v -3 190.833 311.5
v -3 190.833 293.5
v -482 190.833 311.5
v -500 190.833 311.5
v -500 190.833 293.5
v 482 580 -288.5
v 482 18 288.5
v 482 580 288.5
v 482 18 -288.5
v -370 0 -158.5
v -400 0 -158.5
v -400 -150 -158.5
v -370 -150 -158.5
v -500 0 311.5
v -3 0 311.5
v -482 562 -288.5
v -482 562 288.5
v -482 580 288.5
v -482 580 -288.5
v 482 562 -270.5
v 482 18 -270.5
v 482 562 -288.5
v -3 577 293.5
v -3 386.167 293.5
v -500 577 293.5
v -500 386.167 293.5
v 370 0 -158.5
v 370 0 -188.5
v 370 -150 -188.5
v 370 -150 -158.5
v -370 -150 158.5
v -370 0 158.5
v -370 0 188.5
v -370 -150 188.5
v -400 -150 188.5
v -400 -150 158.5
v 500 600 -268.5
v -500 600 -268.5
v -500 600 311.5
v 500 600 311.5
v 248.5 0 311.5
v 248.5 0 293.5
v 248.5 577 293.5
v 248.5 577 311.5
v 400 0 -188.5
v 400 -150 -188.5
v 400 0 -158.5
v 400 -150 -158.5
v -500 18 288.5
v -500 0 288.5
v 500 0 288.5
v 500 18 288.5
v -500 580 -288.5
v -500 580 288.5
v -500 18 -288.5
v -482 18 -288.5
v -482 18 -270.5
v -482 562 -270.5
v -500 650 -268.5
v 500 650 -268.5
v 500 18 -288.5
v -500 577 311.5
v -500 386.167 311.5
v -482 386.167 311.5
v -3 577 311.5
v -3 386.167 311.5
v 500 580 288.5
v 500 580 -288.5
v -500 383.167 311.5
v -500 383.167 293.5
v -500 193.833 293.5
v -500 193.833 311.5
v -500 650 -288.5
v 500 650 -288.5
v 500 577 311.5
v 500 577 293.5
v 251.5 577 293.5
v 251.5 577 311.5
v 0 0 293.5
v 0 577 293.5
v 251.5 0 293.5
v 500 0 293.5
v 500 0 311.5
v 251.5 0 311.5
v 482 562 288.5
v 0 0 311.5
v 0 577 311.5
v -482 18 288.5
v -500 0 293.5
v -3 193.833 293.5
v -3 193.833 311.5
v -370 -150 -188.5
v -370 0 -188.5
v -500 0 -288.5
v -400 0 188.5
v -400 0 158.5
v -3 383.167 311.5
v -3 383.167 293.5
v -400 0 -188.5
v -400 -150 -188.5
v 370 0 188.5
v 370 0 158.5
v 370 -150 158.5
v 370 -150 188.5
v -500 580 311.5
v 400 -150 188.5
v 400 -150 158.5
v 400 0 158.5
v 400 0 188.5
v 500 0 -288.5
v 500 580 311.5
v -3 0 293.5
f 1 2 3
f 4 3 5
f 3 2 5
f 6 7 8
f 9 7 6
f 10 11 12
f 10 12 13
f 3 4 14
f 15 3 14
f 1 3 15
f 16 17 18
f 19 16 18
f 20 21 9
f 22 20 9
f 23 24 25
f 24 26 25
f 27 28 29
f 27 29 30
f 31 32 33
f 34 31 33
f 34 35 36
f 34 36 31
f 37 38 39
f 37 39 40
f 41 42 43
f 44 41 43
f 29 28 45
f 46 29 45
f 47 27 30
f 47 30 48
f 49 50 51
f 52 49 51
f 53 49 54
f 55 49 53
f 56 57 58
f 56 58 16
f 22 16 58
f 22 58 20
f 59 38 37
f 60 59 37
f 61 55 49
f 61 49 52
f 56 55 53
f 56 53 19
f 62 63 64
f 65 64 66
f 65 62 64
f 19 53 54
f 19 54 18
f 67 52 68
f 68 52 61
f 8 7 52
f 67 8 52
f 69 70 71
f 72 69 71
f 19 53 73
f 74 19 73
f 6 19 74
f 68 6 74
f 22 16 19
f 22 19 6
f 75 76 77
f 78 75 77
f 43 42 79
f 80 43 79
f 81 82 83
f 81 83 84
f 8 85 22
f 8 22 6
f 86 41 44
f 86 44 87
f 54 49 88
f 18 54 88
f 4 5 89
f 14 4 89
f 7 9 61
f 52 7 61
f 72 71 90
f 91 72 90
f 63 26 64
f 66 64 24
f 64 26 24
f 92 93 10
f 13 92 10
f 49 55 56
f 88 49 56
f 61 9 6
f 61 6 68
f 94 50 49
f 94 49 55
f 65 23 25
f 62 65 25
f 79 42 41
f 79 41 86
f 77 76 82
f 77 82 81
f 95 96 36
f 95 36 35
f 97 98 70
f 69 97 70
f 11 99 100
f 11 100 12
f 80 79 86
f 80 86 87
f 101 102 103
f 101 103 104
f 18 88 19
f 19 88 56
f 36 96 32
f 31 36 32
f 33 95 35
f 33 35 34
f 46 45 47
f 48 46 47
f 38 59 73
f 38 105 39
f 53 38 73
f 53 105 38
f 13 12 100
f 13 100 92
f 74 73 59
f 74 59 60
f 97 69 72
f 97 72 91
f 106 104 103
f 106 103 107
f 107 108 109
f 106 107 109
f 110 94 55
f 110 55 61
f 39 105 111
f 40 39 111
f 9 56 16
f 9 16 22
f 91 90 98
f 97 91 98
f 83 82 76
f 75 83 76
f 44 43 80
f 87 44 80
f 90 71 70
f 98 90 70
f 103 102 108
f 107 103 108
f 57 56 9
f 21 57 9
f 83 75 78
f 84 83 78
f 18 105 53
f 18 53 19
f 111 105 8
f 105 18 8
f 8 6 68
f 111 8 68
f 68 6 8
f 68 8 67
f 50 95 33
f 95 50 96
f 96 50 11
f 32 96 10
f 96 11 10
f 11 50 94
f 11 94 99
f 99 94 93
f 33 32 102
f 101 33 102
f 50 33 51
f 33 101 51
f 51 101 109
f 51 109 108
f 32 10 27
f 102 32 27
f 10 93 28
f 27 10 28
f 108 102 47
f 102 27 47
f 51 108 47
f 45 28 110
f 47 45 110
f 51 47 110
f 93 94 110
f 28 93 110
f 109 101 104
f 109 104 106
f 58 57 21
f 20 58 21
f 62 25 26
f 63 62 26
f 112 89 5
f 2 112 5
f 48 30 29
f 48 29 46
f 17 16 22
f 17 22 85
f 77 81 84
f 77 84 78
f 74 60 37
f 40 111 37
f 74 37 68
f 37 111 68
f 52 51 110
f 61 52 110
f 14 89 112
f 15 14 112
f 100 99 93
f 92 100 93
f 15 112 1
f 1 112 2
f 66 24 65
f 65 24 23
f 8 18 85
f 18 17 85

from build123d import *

# Parameters (mm, degrees)
CROQUIS1_W                = 1000
CROQUIS1_H                = 577
SALIENTE_EXTRUIR1_DEPTH   = 580
VACIADO1_T                = -18
CROQUIS2_W                = 1000
CROQUIS2_H                = 600
SALIENTE_EXTRUIR2_DEPTH   = 20
CROQUIS3_W                = 479
CROQUIS3_H                = 175.833333333
CROQUIS3_W_2              = 18
CROQUIS3_H_2              = 189.333333334
CROQUIS3_H_3              = 172.833333333
SALIENTE_EXTRUIR4_DEPTH   = 23
CROQUIS5_W                = 5
CROQUIS5_H                = 577
CORTAR_EXTRUIR1_DEPTH     = 1208.075908963
CROQUIS6_W                = 248.5
CROQUIS6_H                = 577
SALIENTE_EXTRUIR5_DEPTH   = 18
SALIENTE_EXTRUIR5_2_DEPTH = 18
PARTIR5_OUTLINE_W         = 1000
PARTIR5_OUTLINE_H         = 577
PARTIR5_DEPTH             = 18
PARTIR5_2_OUTLINE_W       = 1000
PARTIR5_2_OUTLINE_H       = 577
PARTIR5_2_DEPTH           = 18
PARTIR6_START             = 18
PARTIR6_OUTLINE_W         = 18
PARTIR6_OUTLINE_H         = 577
PARTIR6_DEPTH             = 562
PARTIR6_2_OUTLINE_W       = 18
PARTIR6_2_OUTLINE_H       = 577
PARTIR6_2_DEPTH           = 562
PARTIR6_START_2           = -500
PARTIR6_3_OUTLINE_W       = 562
PARTIR6_3_OUTLINE_H       = 577
PARTIR6_3_DEPTH           = 18
PARTIR6_START_3           = 482
PARTIR6_4_OUTLINE_W       = 562
PARTIR6_4_OUTLINE_H       = 577
PARTIR6_4_DEPTH           = 18
PARTIR11_START            = -482
PARTIR11_OUTLINE_W        = 544
PARTIR11_OUTLINE_H        = 18
PARTIR11_DEPTH            = 964
PARTIR11_START_2          = 18
PARTIR11_2_OUTLINE_W      = 964
PARTIR11_2_OUTLINE_H      = 18
PARTIR11_2_DEPTH          = 544
CROQUIS7_W                = 1000
CROQUIS7_H                = 20
SALIENTE_EXTRUIR6_DEPTH   = 50
CROQUIS8_W                = 30
CROQUIS8_H                = 30
SALIENTE_EXTRUIR7_DEPTH   = 150


# Read off the part's stored shape, not the designer's step: Partir5, Partir6, Partir11
with BuildPart() as part:
    # Croquis1 → Saliente-Extruir1 (new body)
    with BuildSketch(Plane(origin=(0, 0, 0), x_dir=(1, 0, 0), z_dir=(0, 1, 0))):
        Rectangle(CROQUIS1_W, CROQUIS1_H)
    extrude(amount=SALIENTE_EXTRUIR1_DEPTH)

    # Vaciado1
    vaciado1_openings = [part.faces().sort_by_distance(p)[0] for p in [
        (0, 290, 288.5),
    ]]
    offset(amount=VACIADO1_T, openings=vaciado1_openings, kind=Kind.INTERSECTION)

    # Croquis2 → Saliente-Extruir2 (add)
    with BuildSketch(Plane(origin=(0, 580, 0), x_dir=(1, 0, 0), z_dir=(0, 1, 0))):
        with Locations((0, -11.5)):
            Rectangle(CROQUIS2_W, CROQUIS2_H)
    extrude(amount=SALIENTE_EXTRUIR2_DEPTH)

    # Croquis3 → Saliente-Extruir4 (add)
    with BuildSketch(Plane.XY.offset(288.5)):
        Polygon((-3, 577), (-500, 577), (-500, 386.166666667), (-482, 386.166666667), (-482, 562), (-3, 562), align=None)
        with Locations((-242.5, 474.083333334)):
            Rectangle(CROQUIS3_W, CROQUIS3_H)
        with Locations((-491, 288.5)):
            Rectangle(CROQUIS3_W_2, CROQUIS3_H_2)
        with Locations((-242.5, 288.5)):
            Rectangle(CROQUIS3_W, CROQUIS3_H_2)
        Polygon((-482, 18), (-482, 190.833333333), (-500, 190.833333333), (-500, 0), (-3, 0), (-3, 18), align=None)
        with Locations((-242.5, 104.416666667)):
            Rectangle(CROQUIS3_W, CROQUIS3_H_3)
    extrude(amount=SALIENTE_EXTRUIR4_DEPTH)

    # Croquis5 → Cortar-Extruir1 (cut, through all)
    with BuildSketch(Plane.ZY.offset(500)):
        with Locations((291, 288.5)):
            Rectangle(CROQUIS5_W, CROQUIS5_H)
    extrude(amount=-CORTAR_EXTRUIR1_DEPTH, mode=Mode.SUBTRACT)


with BuildPart() as cortar_extruir1_piece_1:
    # of the separate pieces the step leaves, piece 1, a body of its own (cortar_extruir1_pieces)
    add(part.part.solids().sort_by_distance((-500, 0, -288.5))[0])

    # Partir5 2 outline → Partir5 2 (cut)
    with BuildSketch(Plane(origin=(0, 0, 0), x_dir=(1, 0, 0), z_dir=(0, 1, 0))):
        Rectangle(PARTIR5_2_OUTLINE_W, PARTIR5_2_OUTLINE_H)
    extrude(amount=PARTIR5_2_DEPTH, mode=Mode.SUBTRACT)

    # Partir6 3 outline → Partir6 3 (cut)
    with BuildSketch(Plane.YZ.offset(PARTIR6_START_2)):
        with Locations((299, 0)):
            Rectangle(PARTIR6_3_OUTLINE_W, PARTIR6_3_OUTLINE_H)
    extrude(amount=PARTIR6_3_DEPTH, mode=Mode.SUBTRACT)

    # Partir6 4 outline → Partir6 4 (cut)
    with BuildSketch(Plane.YZ.offset(PARTIR6_START_3)):
        with Locations((299, 0)):
            Rectangle(PARTIR6_4_OUTLINE_W, PARTIR6_4_OUTLINE_H)
    extrude(amount=PARTIR6_4_DEPTH, mode=Mode.SUBTRACT)

    # Partir11 outline → Partir11 (cut)
    with BuildSketch(Plane.YZ.offset(PARTIR11_START)):
        with Locations((290, -279.5)):
            Rectangle(PARTIR11_OUTLINE_W, PARTIR11_OUTLINE_H)
    extrude(amount=PARTIR11_DEPTH, mode=Mode.SUBTRACT)

    # Croquis7 → Saliente-Extruir6 (add)
    with BuildSketch(Plane(origin=(0, 600, 0), x_dir=(1, 0, 0), z_dir=(0, 1, 0))):
        with Locations((0, 278.5)):
            Rectangle(CROQUIS7_W, CROQUIS7_H)
    extrude(amount=SALIENTE_EXTRUIR6_DEPTH)


with BuildPart() as cortar_extruir1_piece_2:
    # of the separate pieces the step leaves, piece 2, a body of its own (cortar_extruir1_pieces)
    add(part.part.solids().sort_by_distance((-500, 386.166666667, 293.5))[0])


with BuildPart() as cortar_extruir1_piece_3:
    # of the separate pieces the step leaves, piece 3, a body of its own (cortar_extruir1_pieces)
    add(part.part.solids().sort_by_distance((-500, 190.833333333, 293.5))[0])


with BuildPart() as cortar_extruir1_piece_4:
    # of the separate pieces the step leaves, piece 4, a body of its own (cortar_extruir1_pieces)
    add(part.part.solids().sort_by_distance((-500, 193.833333333, 293.5))[0])


with BuildPart() as body_5:
    # Croquis6 → Saliente-Extruir5 (new body)
    with BuildSketch(Plane(origin=(0, 0, 293.5), x_dir=(-1, 0, 0), z_dir=(0, 0, -1))):
        with Locations((-124.25, 288.5)):
            Rectangle(CROQUIS6_W, CROQUIS6_H)
    extrude(amount=-SALIENTE_EXTRUIR5_DEPTH)


with BuildPart() as body_6:
    # Croquis6 → Saliente-Extruir5 2 (new body)
    with BuildSketch(Plane(origin=(0, 0, 293.5), x_dir=(-1, 0, 0), z_dir=(0, 0, -1))):
        with Locations((-375.75, 288.5)):
            Rectangle(CROQUIS6_W, CROQUIS6_H)
    extrude(amount=-SALIENTE_EXTRUIR5_2_DEPTH)


with BuildPart() as body_7:
    # Partir5 outline → Partir5 (new body)
    with BuildSketch(Plane(origin=(0, 0, 0), x_dir=(1, 0, 0), z_dir=(0, 1, 0))):
        Rectangle(PARTIR5_OUTLINE_W, PARTIR5_OUTLINE_H)
    extrude(amount=PARTIR5_DEPTH)

    # Croquis8 → Saliente-Extruir7 (add)
    with BuildSketch(Plane.XZ):
        with Locations((-385, 173.5)):
            Rectangle(CROQUIS8_W, CROQUIS8_H)
        with Locations((385, 173.5)):
            Rectangle(CROQUIS8_W, CROQUIS8_H)
        with Locations((385, -173.5)):
            Rectangle(CROQUIS8_W, CROQUIS8_H)
        with Locations((-385, -173.5)):
            Rectangle(CROQUIS8_W, CROQUIS8_H)
    extrude(amount=SALIENTE_EXTRUIR7_DEPTH)


with BuildPart() as body_8:
    # Partir6 outline → Partir6 (new body)
    with BuildSketch(Plane(origin=(0, 0, 0), x_dir=(1, 0, 0), z_dir=(0, 1, 0)).offset(PARTIR6_START)):
        with Locations((491, 0)):
            Rectangle(PARTIR6_OUTLINE_W, PARTIR6_OUTLINE_H)
    extrude(amount=PARTIR6_DEPTH)


with BuildPart() as body_9:
    # Partir6 2 outline → Partir6 2 (new body)
    with BuildSketch(Plane(origin=(0, 0, 0), x_dir=(1, 0, 0), z_dir=(0, 1, 0)).offset(PARTIR6_START)):
        with Locations((-491, 0)):
            Rectangle(PARTIR6_2_OUTLINE_W, PARTIR6_2_OUTLINE_H)
    extrude(amount=PARTIR6_2_DEPTH)


with BuildPart() as body_10:
    # Partir11 2 outline → Partir11 2 (new body)
    with BuildSketch(Plane(origin=(0, 0, 0), x_dir=(1, 0, 0), z_dir=(0, 1, 0)).offset(PARTIR11_START_2)):
        with Locations((0, 279.5)):
            Rectangle(PARTIR11_2_OUTLINE_W, PARTIR11_2_OUTLINE_H)
    extrude(amount=PARTIR11_2_DEPTH)


solid = Compound([cortar_extruir1_piece_1.part, cortar_extruir1_piece_2.part, cortar_extruir1_piece_3.part, cortar_extruir1_piece_4.part, body_5.part, body_6.part, body_7.part, body_8.part, body_9.part, body_10.part])
